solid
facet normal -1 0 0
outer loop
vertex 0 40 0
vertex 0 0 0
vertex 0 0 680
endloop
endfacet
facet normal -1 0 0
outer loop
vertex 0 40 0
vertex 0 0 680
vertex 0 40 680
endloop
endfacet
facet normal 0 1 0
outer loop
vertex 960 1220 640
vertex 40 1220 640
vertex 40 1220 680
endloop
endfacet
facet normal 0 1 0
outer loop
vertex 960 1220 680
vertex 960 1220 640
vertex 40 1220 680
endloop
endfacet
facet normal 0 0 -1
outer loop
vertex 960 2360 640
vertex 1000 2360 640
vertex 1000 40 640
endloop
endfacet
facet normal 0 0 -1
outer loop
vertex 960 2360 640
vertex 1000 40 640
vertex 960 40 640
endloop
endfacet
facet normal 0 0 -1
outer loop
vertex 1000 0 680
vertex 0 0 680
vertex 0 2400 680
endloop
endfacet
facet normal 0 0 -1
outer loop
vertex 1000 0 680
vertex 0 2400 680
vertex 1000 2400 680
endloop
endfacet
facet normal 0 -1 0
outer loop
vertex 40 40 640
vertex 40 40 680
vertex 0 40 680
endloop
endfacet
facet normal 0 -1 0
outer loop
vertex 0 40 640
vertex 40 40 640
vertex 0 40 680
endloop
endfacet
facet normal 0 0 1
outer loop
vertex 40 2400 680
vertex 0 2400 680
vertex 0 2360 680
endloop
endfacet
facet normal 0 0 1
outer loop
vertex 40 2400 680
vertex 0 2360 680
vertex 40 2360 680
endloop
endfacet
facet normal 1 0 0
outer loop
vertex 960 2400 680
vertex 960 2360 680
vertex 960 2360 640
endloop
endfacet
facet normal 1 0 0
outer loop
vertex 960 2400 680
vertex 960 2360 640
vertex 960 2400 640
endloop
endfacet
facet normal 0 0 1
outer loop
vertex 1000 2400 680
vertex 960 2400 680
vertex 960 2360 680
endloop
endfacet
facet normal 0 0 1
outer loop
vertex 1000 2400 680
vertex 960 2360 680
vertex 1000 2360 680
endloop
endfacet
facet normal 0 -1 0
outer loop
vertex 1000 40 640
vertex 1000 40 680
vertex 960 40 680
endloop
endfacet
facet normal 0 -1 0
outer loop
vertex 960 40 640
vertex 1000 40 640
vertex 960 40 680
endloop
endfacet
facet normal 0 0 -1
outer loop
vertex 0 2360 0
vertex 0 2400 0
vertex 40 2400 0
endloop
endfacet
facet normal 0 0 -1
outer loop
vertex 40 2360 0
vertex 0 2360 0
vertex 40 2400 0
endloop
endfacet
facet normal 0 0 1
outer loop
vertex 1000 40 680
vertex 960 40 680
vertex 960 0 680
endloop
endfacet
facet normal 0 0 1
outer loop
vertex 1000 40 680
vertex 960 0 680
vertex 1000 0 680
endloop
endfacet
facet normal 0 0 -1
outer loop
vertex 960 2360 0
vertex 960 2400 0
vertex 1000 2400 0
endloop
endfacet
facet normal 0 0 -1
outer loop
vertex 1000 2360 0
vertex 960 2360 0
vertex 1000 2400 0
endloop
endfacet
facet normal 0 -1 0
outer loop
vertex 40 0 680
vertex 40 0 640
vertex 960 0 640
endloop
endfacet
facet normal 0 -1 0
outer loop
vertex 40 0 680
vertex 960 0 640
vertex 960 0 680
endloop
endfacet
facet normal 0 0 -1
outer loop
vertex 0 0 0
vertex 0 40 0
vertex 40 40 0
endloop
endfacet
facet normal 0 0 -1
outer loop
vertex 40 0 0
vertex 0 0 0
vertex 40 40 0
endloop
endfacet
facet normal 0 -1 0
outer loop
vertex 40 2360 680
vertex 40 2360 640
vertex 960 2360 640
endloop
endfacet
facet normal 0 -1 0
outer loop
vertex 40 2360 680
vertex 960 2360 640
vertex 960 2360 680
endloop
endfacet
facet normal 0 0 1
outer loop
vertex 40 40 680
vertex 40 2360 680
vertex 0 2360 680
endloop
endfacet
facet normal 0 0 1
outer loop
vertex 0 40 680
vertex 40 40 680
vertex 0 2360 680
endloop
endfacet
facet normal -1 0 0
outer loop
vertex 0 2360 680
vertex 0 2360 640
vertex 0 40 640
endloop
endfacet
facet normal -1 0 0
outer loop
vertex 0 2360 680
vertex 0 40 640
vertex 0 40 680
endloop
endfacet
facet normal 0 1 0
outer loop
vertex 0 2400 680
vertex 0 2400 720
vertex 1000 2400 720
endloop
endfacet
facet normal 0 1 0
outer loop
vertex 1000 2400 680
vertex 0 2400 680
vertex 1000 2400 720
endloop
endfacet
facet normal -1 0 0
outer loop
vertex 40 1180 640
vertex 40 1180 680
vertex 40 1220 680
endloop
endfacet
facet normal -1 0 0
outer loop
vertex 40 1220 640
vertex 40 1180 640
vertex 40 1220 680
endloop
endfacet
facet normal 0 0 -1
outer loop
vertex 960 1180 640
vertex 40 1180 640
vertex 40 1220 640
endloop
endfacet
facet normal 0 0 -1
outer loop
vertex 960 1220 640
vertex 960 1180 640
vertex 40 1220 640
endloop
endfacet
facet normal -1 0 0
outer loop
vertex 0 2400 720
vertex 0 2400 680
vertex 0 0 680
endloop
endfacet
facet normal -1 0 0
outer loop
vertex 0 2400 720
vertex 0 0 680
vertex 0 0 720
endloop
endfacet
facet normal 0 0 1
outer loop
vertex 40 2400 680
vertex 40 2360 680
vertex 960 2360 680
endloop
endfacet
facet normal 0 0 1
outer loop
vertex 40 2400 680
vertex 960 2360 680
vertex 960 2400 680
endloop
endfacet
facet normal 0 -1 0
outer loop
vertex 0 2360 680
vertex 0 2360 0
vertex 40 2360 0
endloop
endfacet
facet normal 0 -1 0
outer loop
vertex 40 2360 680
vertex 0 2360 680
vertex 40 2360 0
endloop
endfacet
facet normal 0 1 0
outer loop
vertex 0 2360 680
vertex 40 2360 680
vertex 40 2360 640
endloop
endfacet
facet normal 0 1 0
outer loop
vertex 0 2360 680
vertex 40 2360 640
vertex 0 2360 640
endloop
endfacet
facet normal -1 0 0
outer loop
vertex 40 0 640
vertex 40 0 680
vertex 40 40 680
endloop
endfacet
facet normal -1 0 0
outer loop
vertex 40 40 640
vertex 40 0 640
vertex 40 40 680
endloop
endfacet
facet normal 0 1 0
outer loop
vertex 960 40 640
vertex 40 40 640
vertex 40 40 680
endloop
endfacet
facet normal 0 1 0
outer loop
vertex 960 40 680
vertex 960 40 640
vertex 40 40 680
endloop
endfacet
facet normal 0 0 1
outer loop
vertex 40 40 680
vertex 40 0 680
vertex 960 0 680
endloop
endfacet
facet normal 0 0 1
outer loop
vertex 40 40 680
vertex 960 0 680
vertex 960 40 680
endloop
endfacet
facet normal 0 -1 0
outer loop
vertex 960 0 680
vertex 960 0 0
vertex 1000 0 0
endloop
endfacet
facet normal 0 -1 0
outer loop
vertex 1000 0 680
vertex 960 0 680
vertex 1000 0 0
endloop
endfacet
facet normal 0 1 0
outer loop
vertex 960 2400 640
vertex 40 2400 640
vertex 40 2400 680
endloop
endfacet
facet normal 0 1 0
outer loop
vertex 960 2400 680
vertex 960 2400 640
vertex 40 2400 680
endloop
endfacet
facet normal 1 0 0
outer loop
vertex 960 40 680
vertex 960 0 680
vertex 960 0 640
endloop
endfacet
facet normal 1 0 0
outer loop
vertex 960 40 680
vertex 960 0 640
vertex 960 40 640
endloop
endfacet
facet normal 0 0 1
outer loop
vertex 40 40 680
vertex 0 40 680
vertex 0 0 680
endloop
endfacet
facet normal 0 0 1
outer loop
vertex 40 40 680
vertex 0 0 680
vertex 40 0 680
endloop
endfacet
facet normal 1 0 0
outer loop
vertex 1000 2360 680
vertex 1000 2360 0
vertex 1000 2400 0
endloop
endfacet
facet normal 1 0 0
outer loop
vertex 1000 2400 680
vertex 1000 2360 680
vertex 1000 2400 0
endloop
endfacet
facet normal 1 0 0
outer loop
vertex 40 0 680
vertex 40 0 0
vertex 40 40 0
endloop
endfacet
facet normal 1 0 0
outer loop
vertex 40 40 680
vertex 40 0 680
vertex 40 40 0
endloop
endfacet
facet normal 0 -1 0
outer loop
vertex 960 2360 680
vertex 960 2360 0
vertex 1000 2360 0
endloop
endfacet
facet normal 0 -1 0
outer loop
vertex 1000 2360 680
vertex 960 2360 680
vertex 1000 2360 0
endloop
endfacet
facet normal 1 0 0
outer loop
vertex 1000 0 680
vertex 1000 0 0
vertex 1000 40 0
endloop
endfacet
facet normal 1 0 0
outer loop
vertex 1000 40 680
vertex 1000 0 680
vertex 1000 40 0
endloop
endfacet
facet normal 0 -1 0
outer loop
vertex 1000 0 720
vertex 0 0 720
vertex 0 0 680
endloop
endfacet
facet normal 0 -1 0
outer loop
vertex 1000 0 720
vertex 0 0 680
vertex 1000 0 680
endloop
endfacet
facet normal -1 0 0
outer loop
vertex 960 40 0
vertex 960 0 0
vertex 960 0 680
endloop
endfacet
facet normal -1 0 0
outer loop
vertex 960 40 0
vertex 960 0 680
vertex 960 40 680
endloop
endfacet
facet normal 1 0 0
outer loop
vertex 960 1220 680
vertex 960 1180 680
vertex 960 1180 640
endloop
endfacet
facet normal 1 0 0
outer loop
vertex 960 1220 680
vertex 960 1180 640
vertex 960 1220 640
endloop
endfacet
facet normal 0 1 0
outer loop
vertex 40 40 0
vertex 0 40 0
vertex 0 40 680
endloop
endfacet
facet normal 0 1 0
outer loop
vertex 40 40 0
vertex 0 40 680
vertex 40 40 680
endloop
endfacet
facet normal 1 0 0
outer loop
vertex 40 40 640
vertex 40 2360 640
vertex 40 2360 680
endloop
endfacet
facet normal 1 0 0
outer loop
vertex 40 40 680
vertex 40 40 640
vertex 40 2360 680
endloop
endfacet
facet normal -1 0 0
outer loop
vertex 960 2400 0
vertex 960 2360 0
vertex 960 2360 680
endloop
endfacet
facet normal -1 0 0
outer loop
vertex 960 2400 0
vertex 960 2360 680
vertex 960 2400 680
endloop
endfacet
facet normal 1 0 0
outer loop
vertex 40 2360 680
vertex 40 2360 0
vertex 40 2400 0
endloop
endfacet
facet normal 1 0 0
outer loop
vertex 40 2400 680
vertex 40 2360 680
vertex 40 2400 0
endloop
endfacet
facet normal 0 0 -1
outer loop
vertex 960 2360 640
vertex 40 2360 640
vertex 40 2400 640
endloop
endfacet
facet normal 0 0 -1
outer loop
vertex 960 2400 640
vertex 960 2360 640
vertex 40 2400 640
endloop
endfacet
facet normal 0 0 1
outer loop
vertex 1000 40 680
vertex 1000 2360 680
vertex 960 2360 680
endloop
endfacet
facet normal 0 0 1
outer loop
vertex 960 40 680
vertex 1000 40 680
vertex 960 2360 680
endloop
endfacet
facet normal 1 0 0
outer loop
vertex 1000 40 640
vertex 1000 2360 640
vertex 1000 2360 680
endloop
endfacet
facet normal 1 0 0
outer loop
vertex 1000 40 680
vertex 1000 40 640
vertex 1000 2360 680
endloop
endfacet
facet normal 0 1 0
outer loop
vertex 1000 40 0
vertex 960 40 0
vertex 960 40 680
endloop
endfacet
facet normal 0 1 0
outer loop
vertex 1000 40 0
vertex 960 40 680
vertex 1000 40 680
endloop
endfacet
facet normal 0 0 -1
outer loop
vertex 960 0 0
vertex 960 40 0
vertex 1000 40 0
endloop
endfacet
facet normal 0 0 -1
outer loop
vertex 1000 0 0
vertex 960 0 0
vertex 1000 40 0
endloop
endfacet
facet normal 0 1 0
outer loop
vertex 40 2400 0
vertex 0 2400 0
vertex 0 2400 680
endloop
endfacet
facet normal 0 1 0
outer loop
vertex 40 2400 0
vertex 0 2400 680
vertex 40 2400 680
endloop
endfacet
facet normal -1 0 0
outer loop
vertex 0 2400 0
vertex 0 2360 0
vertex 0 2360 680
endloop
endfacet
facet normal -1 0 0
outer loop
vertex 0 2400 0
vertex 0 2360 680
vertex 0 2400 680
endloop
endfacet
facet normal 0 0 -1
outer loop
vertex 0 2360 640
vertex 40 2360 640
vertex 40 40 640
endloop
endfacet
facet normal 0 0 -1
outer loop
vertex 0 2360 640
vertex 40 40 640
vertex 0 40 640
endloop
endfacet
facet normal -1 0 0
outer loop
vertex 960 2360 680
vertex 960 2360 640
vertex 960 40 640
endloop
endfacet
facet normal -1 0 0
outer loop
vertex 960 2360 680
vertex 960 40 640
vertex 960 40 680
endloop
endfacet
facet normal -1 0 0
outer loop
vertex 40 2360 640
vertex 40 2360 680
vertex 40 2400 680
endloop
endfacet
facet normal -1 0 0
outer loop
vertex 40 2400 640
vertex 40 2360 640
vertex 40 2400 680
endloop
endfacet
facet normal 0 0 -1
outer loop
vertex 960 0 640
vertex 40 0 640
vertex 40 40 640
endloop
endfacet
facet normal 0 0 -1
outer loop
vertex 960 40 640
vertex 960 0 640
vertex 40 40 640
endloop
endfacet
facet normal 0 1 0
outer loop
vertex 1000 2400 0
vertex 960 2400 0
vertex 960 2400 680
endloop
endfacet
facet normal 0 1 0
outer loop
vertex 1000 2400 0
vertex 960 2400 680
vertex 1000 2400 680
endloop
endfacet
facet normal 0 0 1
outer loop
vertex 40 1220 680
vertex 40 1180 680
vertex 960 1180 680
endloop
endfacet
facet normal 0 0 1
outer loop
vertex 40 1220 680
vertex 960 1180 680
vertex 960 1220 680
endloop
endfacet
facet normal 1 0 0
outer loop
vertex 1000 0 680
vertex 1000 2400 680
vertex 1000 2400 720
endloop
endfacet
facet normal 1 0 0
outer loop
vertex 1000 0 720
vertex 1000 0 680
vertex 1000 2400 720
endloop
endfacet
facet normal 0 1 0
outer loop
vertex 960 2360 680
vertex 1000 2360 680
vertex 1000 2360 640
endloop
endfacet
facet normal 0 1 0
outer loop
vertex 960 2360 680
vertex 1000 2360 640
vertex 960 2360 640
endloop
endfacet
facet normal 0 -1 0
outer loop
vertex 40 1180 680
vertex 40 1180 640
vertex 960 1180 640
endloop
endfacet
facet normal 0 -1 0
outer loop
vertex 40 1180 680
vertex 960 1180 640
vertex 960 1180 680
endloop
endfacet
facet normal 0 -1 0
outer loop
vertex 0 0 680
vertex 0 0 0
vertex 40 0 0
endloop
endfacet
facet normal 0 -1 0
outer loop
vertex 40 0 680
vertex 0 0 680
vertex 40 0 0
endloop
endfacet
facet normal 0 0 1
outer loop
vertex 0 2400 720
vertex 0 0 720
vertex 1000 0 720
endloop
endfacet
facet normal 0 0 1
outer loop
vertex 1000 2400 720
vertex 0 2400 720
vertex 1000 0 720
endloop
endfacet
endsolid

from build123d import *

# Parameters (mm, degrees)
F0_W      = 40
F0_H      = 40
F1_DEPTH  = 680
F2_W      = 40
F2_H      = 40
F3_W      = 40
F3_H      = 40
F4_DEPTH  = 2320
F5_W      = 40
F5_H      = 40
F6_W      = 40
F6_H      = 40
F7_W      = 40
F7_H      = 40
F8_DEPTH  = 920
F9_W      = 1000
F9_H      = 40
F10_DEPTH = 2400


with BuildPart() as f1:
    # F0 (on Top) → F1 (new body)
    with BuildSketch(Plane.XY):
        with Locations((20, 20)):
            Rectangle(F0_W, F0_H)
        with Locations((980, 20)):
            Rectangle(F0_W, F0_H)
        with Locations((20, 2380)):
            Rectangle(F0_W, F0_H)
        with Locations((980, 2380)):
            Rectangle(F0_W, F0_H)
    extrude(amount=F1_DEPTH)


with BuildPart() as f4:
    # F2 (on face) + F3 (on face) → F4 (new body)
    with BuildSketch(Plane(origin=(0, 40, 0), x_dir=(-1, 0, 0), z_dir=(0, 1, 0))):
        with Locations((-20, 660)):
            Rectangle(F2_W, F2_H)
    with BuildSketch(Plane(origin=(0, 40, 0), x_dir=(-1, 0, 0), z_dir=(0, 1, 0))):
        with Locations((-980, 660)):
            Rectangle(F3_W, F3_H)
    extrude(amount=F4_DEPTH)


with BuildPart() as f8:
    # F5 (on face) + F6 (on face) + F7 (on face) → F8 (new body)
    with BuildSketch(Plane.YZ.offset(40)):
        with Locations((20, 660)):
            Rectangle(F5_W, F5_H)
    with BuildSketch(Plane.YZ.offset(40)):
        with Locations((1200, 660)):
            Rectangle(F6_W, F6_H)
    with BuildSketch(Plane.YZ.offset(40)):
        with Locations((2380, 660)):
            Rectangle(F7_W, F7_H)
    extrude(amount=F8_DEPTH)


with BuildPart() as f10:
    # F9 (on Front) → F10 (new body)
    with BuildSketch(Plane.XZ):
        with Locations((500, 700)):
            Rectangle(F9_W, F9_H)
    extrude(amount=-F10_DEPTH)


solid = Compound([f1.part, f4.part, f8.part, f10.part])
